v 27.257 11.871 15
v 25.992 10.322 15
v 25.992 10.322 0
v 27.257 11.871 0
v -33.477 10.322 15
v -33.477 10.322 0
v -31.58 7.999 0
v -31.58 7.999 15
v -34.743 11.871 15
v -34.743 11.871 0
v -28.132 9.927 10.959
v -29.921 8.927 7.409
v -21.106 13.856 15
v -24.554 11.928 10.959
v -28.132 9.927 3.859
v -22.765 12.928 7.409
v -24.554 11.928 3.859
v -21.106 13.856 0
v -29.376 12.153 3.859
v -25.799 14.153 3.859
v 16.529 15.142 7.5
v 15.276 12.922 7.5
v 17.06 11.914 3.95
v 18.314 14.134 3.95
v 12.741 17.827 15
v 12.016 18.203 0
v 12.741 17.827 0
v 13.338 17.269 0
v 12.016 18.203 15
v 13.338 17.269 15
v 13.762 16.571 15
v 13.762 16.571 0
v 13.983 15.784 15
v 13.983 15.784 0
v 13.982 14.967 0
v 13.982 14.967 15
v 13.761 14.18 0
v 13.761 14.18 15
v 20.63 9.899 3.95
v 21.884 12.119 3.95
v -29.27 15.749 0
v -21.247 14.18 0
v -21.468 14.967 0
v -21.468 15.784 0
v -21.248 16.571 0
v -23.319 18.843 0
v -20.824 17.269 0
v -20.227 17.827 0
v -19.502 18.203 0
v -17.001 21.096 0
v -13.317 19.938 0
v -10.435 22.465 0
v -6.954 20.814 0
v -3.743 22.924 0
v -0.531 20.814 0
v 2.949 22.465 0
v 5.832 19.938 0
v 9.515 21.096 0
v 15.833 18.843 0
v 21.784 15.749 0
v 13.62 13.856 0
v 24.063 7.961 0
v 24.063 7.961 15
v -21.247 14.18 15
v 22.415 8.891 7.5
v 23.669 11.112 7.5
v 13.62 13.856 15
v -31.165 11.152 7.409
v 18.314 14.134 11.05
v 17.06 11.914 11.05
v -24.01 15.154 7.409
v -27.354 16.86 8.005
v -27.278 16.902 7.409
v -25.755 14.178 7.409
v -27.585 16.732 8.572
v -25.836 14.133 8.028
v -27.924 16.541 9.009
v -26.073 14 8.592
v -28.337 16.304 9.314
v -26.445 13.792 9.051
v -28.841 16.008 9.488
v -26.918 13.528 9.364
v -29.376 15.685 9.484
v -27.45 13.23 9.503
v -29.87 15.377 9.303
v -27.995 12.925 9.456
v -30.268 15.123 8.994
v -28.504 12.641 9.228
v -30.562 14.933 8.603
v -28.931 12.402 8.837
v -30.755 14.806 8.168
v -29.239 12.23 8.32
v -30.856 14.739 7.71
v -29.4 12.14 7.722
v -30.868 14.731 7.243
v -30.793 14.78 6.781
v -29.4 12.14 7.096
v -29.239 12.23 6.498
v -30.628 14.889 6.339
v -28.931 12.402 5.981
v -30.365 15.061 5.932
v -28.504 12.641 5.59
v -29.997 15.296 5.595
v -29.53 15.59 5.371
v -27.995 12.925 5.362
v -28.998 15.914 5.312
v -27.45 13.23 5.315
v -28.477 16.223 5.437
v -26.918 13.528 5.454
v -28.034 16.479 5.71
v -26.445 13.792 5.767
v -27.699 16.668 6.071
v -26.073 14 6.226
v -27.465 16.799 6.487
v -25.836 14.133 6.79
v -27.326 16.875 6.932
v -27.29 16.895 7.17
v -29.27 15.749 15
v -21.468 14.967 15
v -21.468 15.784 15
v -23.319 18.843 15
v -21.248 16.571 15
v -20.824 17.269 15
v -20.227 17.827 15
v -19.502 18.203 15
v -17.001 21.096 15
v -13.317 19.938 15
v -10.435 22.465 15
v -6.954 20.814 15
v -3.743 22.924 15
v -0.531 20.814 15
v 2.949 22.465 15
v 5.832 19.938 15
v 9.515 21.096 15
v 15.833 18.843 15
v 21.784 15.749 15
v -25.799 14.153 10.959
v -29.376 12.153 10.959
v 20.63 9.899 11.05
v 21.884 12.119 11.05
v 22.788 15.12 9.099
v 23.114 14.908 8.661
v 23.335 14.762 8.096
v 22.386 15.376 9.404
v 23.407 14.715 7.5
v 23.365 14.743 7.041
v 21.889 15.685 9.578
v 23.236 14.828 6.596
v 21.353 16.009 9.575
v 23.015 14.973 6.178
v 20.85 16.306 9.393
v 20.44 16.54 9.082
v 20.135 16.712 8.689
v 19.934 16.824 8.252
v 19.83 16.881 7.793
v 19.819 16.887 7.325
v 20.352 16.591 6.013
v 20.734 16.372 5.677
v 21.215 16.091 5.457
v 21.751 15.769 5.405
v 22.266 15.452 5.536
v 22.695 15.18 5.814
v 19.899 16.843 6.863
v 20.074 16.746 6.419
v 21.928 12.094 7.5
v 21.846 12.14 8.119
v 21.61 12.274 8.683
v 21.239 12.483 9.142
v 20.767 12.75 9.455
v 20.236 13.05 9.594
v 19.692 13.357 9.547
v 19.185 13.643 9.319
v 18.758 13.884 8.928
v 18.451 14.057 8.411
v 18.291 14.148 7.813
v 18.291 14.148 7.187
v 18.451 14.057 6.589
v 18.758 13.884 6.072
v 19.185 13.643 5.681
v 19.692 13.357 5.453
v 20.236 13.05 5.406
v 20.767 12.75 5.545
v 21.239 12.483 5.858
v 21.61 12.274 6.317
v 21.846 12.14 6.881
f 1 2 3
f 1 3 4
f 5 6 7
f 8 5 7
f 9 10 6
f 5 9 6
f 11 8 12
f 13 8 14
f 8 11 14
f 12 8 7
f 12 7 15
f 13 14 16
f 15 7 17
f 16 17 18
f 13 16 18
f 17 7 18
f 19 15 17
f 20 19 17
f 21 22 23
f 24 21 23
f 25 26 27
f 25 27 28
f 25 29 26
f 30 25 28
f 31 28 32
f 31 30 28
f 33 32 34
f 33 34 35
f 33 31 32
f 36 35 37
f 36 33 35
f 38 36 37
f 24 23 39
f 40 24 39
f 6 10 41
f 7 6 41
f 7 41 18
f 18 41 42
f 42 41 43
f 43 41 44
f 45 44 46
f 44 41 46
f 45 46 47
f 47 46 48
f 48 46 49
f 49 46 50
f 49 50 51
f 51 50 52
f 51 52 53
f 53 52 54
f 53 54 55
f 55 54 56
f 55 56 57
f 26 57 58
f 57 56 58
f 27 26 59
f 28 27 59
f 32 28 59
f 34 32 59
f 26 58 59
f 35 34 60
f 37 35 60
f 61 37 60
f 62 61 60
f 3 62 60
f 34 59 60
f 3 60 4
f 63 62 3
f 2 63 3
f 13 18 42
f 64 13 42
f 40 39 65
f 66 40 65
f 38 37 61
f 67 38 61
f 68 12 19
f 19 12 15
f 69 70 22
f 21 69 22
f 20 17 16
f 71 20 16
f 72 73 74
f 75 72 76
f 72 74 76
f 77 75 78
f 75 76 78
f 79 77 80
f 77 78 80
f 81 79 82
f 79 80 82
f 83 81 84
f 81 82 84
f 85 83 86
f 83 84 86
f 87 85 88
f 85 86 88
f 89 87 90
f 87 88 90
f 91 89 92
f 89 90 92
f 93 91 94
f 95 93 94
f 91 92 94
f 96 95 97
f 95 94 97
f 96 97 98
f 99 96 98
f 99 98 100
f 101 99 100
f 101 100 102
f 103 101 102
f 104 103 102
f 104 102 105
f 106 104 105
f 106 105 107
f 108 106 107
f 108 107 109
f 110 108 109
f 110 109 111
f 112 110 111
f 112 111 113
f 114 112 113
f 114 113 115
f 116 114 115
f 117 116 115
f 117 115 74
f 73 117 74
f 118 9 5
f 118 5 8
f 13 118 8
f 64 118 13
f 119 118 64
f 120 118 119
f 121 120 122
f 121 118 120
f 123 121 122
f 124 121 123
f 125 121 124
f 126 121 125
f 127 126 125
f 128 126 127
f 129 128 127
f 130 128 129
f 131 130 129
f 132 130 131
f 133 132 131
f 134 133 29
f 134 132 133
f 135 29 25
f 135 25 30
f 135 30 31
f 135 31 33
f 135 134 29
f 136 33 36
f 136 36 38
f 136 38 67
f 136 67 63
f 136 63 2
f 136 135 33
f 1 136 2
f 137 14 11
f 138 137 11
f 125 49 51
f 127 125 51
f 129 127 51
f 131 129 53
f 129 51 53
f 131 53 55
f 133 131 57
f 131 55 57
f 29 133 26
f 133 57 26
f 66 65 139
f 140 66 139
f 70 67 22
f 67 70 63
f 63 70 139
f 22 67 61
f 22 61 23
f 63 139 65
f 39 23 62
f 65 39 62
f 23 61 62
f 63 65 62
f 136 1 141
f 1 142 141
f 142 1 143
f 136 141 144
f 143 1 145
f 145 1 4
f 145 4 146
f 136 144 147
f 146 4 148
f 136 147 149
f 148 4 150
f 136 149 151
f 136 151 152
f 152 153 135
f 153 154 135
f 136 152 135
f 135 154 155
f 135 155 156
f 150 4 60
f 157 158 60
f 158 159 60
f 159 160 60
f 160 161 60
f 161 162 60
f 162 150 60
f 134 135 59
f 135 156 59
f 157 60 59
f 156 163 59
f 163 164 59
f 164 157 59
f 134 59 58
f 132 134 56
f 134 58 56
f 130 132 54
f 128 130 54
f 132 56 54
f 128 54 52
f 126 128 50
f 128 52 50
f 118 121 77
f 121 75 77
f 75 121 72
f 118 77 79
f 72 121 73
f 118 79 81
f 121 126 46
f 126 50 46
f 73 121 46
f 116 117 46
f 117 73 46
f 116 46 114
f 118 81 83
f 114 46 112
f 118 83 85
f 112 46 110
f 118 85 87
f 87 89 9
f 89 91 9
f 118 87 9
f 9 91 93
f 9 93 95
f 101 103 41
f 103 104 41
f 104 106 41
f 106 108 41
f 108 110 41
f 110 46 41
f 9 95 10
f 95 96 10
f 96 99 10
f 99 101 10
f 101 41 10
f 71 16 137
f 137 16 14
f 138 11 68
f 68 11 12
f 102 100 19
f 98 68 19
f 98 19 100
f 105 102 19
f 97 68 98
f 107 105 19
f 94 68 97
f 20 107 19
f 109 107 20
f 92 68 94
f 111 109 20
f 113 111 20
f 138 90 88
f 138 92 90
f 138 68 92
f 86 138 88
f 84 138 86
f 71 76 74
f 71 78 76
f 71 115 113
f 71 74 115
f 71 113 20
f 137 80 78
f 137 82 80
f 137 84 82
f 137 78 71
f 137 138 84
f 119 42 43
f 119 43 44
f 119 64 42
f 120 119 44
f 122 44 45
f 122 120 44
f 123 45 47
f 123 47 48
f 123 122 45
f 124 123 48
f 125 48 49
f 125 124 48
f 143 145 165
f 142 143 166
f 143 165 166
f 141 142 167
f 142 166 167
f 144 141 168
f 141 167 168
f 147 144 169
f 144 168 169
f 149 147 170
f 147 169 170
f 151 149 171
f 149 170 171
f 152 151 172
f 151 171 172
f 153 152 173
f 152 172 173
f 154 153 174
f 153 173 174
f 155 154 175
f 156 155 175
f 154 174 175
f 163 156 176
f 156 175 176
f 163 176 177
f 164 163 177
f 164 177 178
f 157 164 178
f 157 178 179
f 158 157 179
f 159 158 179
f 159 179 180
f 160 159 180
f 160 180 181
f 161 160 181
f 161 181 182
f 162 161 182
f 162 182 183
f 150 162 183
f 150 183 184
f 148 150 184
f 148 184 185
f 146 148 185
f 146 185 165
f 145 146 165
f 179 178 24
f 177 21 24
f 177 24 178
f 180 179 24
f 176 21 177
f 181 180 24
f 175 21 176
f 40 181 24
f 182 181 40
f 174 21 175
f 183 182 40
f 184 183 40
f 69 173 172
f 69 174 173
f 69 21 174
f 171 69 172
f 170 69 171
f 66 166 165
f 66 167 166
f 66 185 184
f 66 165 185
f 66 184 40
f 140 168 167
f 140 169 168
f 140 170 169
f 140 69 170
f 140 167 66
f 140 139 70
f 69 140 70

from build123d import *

# Parameters (mm, degrees)
EXTRUDE_2_DEPTH     = 15
FILLET_2_R          = 3
SKETCH_6_R          = 2.1
CUT_EXTRUDE_5_DEPTH = 13.55
SKETCH_7_R          = 2.1
CUT_EXTRUDE_6_DEPTH = 13.55
CUT_EXTRUDE_7_DEPTH = 2.55
CUT_EXTRUDE_8_DEPTH = 2.55


with BuildPart() as part:
    # Эскиз1 → Бобышка-Вытянуть2 (new body)
    with BuildSketch(Plane.XY):
        with BuildLine():
            Line((-34.742798859, 11.871098047), (-33.477492737, 10.322227357))
            Line((-33.477492737, 10.322227357), (-31.579533553, 7.998921321))
            Line((-31.579533553, 7.998921321), (-21.106042067, 13.856051683))
            Line((-21.106042067, 13.856051683), (-22.484178739, 17.02551412))
            ThreePointArc((-22.484178739, 17.02551412), (-3.742798859, 20.923766125), (14.99858102, 17.02551412))
            Line((14.99858102, 17.02551412), (13.620444348, 13.856051683))
            Line((13.620444348, 13.856051683), (24.062716277, 7.960705226))
            Line((24.062716277, 7.960705226), (25.991895018, 10.322227357))
            Line((25.991895018, 10.322227357), (27.257201141, 11.871098047))
            ThreePointArc((27.257201141, 11.871098047), (-3.742798859, 22.923766125), (-34.742798859, 11.871098047))
        make_face()
    extrude(amount=EXTRUDE_2_DEPTH)

    # Скругление2
    fillet_2_edges = [part.edges().sort_by_distance(p)[0] for p in [
        (14.99858102, 17.02551412, 7.5),
        (-22.484178739, 17.02551412, 7.5),
    ]]
    fillet(fillet_2_edges, radius=FILLET_2_R)

    # Эскиз6 → Вырез-Вытянуть5 (cut)
    with BuildSketch(Plane(origin=(9.223958982, 16.338155636, 0), x_dir=(0.8708059042632018, -0.4916269694599224, 0), z_dir=(-0.49162696945992235, -0.8708059042632017, 0))):
        with Locations((11.048754659, 7.5)):
            Circle(SKETCH_6_R)
    extrude(amount=-CUT_EXTRUDE_5_DEPTH, mode=Mode.SUBTRACT)

    # Эскиз7 → Вырез-Вытянуть6 (cut)
    with BuildSketch(Plane(origin=(-10.930954108, 19.546304709, 0), x_dir=(0.8727909572035157, 0.48809419687573696, 0), z_dir=(0.488094196875737, -0.8727909572035158, 0))):
        with Locations((-17.65810424, 7.409111806)):
            Circle(SKETCH_7_R)
    extrude(amount=-CUT_EXTRUDE_6_DEPTH, mode=Mode.SUBTRACT)

    # Эскиз8 → Вырез-Вытянуть7 (cut)
    with BuildSketch(Plane(origin=(-10.930954108, 19.546304709, 0), x_dir=(0.8727909572035158, 0.488094196875737, 0), z_dir=(0.488094196875737, -0.8727909572035158, 0))):
        Polygon((-19.707697696, 3.859111806), (-15.608510784, 3.859111806), (-13.558917329, 7.409111806), (-15.608510784, 10.959111806), (-19.707697696, 10.959111806), (-21.757291151, 7.409111806), align=None)
    extrude(amount=-CUT_EXTRUDE_7_DEPTH, mode=Mode.SUBTRACT)

    # Эскиз9 → Вырез-Вытянуть8 (cut)
    with BuildSketch(Plane(origin=(9.223958982, 16.338155636, 0), x_dir=(0.8708059042632018, -0.49162696945992246, 0), z_dir=(-0.4916269694599224, -0.8708059042632017, 0))):
        Polygon((8.999161204, 3.95), (13.098348115, 3.95), (15.147941571, 7.5), (13.098348115, 11.05), (8.999161204, 11.05), (6.949567748, 7.5), align=None)
    extrude(amount=-CUT_EXTRUDE_8_DEPTH, mode=Mode.SUBTRACT)


solid = part.part
